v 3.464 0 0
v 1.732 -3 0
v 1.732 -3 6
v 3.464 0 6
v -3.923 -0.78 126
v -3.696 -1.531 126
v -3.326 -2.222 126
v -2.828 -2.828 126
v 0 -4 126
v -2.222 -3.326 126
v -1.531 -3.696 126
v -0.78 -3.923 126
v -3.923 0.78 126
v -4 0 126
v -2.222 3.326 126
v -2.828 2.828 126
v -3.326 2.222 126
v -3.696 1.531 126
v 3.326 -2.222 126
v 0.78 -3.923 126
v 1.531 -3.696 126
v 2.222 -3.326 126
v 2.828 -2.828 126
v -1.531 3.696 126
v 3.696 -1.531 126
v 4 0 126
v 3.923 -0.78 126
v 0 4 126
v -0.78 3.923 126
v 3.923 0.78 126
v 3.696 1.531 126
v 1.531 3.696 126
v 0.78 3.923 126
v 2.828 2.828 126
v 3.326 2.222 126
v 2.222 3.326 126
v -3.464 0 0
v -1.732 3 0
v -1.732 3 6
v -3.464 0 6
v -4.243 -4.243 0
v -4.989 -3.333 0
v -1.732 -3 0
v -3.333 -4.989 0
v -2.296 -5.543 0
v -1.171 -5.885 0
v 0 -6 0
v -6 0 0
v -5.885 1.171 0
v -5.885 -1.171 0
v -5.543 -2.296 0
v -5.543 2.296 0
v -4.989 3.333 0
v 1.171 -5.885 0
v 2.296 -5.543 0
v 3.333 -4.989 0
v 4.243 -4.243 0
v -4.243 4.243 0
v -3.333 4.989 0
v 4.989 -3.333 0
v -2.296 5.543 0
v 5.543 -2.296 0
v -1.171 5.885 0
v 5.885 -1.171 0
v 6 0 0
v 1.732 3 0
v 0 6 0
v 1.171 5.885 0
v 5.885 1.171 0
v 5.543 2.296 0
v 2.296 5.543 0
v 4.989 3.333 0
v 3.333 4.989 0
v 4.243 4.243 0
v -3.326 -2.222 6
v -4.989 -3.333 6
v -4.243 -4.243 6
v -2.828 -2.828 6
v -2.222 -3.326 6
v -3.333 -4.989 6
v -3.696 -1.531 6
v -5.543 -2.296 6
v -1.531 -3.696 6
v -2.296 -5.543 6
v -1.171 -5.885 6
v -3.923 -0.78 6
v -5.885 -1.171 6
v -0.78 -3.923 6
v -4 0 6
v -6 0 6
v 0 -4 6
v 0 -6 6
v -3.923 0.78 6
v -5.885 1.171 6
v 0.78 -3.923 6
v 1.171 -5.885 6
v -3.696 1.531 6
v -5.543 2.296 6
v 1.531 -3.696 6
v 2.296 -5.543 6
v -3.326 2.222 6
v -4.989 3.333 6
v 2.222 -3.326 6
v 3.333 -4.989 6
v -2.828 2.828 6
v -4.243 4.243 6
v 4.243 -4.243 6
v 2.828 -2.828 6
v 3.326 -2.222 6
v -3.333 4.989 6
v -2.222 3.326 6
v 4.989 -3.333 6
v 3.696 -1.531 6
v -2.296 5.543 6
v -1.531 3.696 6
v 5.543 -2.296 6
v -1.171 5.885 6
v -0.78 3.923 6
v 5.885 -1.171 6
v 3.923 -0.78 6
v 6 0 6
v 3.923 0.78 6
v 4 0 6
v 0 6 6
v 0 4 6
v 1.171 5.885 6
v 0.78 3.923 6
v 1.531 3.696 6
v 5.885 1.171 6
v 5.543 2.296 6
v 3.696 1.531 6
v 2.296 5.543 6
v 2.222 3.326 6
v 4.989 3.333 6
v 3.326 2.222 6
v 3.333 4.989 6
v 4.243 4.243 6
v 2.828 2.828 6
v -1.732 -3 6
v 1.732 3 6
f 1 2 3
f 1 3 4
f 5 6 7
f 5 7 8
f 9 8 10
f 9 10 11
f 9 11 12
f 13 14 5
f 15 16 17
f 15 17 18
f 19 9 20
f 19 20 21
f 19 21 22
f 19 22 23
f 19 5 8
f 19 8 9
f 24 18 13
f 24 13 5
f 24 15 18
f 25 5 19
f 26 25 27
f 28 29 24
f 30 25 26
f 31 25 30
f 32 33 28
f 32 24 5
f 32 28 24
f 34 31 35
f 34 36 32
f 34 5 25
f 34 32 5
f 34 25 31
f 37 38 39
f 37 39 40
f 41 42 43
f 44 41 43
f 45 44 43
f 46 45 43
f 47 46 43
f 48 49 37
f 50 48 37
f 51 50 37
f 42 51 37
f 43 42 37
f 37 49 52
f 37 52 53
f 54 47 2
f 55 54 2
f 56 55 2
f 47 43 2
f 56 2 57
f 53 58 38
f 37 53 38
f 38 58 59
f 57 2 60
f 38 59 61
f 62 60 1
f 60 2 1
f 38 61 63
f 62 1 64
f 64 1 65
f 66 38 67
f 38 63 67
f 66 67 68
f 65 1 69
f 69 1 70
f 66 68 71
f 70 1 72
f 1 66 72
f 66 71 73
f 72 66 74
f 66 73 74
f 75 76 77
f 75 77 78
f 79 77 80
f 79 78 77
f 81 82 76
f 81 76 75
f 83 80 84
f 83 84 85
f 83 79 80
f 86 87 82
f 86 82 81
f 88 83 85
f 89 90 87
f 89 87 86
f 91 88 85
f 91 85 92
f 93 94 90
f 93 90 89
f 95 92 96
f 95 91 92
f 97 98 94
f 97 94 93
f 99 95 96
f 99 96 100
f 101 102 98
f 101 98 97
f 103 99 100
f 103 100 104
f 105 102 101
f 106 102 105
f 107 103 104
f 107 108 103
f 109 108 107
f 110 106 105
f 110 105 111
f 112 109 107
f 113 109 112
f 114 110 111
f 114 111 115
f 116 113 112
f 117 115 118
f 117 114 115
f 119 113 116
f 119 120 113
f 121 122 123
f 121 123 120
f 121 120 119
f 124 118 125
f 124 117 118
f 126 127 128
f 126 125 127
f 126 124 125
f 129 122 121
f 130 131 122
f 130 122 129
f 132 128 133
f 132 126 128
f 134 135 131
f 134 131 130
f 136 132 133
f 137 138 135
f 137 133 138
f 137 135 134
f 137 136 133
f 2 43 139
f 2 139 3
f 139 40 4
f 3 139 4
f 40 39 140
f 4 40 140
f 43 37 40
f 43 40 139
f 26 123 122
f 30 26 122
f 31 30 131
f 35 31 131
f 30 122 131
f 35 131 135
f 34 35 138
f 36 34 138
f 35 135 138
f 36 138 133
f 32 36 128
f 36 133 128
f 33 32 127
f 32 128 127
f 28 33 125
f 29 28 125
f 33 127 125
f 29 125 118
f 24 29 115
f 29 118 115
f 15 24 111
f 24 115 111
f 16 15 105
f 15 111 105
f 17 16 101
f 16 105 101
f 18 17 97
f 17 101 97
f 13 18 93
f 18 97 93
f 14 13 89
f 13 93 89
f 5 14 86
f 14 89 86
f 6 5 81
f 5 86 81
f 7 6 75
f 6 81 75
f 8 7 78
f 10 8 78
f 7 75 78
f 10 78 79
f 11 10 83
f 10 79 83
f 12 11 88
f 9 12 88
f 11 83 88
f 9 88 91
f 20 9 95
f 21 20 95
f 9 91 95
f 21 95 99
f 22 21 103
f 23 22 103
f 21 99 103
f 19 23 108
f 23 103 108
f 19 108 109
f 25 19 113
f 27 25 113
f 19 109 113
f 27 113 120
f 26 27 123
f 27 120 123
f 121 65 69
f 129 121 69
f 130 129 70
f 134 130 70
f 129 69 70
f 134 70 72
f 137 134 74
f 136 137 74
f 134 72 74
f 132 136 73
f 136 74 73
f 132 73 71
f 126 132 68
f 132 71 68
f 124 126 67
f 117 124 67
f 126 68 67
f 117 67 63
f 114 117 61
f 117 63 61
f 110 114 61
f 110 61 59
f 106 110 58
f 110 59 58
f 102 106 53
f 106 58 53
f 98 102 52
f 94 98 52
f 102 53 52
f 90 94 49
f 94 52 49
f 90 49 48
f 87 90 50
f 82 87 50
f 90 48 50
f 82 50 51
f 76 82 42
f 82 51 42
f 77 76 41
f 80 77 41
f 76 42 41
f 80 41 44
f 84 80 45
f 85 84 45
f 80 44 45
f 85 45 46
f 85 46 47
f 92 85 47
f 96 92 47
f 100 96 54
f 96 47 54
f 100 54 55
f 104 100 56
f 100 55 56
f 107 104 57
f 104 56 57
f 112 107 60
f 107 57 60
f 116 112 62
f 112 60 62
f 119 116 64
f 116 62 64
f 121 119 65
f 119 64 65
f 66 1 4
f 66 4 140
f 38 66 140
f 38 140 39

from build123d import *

# Parameters (mm, degrees)
SKETCH_1_R      = 6
EXTRUDE_1_DEPTH = 6
SKETCH_2_R      = 4
EXTRUDE_2_DEPTH = 120


with BuildPart() as part:
    # 草图1 → 凸台-拉伸1 (new body)
    with BuildSketch(Plane.XY):
        Circle(SKETCH_1_R)
        Polygon((3.464101615, 0), (1.732050808, 3), (-1.732050808, 3), (-3.464101615, 0), (-1.732050808, -3), (1.732050808, -3), align=None, mode=Mode.SUBTRACT)
    extrude(amount=EXTRUDE_1_DEPTH)

    # 草图2 → 凸台-拉伸2 (add)
    with BuildSketch(Plane.XY.offset(6)):
        Circle(SKETCH_2_R)
    extrude(amount=EXTRUDE_2_DEPTH)


solid = part.part
